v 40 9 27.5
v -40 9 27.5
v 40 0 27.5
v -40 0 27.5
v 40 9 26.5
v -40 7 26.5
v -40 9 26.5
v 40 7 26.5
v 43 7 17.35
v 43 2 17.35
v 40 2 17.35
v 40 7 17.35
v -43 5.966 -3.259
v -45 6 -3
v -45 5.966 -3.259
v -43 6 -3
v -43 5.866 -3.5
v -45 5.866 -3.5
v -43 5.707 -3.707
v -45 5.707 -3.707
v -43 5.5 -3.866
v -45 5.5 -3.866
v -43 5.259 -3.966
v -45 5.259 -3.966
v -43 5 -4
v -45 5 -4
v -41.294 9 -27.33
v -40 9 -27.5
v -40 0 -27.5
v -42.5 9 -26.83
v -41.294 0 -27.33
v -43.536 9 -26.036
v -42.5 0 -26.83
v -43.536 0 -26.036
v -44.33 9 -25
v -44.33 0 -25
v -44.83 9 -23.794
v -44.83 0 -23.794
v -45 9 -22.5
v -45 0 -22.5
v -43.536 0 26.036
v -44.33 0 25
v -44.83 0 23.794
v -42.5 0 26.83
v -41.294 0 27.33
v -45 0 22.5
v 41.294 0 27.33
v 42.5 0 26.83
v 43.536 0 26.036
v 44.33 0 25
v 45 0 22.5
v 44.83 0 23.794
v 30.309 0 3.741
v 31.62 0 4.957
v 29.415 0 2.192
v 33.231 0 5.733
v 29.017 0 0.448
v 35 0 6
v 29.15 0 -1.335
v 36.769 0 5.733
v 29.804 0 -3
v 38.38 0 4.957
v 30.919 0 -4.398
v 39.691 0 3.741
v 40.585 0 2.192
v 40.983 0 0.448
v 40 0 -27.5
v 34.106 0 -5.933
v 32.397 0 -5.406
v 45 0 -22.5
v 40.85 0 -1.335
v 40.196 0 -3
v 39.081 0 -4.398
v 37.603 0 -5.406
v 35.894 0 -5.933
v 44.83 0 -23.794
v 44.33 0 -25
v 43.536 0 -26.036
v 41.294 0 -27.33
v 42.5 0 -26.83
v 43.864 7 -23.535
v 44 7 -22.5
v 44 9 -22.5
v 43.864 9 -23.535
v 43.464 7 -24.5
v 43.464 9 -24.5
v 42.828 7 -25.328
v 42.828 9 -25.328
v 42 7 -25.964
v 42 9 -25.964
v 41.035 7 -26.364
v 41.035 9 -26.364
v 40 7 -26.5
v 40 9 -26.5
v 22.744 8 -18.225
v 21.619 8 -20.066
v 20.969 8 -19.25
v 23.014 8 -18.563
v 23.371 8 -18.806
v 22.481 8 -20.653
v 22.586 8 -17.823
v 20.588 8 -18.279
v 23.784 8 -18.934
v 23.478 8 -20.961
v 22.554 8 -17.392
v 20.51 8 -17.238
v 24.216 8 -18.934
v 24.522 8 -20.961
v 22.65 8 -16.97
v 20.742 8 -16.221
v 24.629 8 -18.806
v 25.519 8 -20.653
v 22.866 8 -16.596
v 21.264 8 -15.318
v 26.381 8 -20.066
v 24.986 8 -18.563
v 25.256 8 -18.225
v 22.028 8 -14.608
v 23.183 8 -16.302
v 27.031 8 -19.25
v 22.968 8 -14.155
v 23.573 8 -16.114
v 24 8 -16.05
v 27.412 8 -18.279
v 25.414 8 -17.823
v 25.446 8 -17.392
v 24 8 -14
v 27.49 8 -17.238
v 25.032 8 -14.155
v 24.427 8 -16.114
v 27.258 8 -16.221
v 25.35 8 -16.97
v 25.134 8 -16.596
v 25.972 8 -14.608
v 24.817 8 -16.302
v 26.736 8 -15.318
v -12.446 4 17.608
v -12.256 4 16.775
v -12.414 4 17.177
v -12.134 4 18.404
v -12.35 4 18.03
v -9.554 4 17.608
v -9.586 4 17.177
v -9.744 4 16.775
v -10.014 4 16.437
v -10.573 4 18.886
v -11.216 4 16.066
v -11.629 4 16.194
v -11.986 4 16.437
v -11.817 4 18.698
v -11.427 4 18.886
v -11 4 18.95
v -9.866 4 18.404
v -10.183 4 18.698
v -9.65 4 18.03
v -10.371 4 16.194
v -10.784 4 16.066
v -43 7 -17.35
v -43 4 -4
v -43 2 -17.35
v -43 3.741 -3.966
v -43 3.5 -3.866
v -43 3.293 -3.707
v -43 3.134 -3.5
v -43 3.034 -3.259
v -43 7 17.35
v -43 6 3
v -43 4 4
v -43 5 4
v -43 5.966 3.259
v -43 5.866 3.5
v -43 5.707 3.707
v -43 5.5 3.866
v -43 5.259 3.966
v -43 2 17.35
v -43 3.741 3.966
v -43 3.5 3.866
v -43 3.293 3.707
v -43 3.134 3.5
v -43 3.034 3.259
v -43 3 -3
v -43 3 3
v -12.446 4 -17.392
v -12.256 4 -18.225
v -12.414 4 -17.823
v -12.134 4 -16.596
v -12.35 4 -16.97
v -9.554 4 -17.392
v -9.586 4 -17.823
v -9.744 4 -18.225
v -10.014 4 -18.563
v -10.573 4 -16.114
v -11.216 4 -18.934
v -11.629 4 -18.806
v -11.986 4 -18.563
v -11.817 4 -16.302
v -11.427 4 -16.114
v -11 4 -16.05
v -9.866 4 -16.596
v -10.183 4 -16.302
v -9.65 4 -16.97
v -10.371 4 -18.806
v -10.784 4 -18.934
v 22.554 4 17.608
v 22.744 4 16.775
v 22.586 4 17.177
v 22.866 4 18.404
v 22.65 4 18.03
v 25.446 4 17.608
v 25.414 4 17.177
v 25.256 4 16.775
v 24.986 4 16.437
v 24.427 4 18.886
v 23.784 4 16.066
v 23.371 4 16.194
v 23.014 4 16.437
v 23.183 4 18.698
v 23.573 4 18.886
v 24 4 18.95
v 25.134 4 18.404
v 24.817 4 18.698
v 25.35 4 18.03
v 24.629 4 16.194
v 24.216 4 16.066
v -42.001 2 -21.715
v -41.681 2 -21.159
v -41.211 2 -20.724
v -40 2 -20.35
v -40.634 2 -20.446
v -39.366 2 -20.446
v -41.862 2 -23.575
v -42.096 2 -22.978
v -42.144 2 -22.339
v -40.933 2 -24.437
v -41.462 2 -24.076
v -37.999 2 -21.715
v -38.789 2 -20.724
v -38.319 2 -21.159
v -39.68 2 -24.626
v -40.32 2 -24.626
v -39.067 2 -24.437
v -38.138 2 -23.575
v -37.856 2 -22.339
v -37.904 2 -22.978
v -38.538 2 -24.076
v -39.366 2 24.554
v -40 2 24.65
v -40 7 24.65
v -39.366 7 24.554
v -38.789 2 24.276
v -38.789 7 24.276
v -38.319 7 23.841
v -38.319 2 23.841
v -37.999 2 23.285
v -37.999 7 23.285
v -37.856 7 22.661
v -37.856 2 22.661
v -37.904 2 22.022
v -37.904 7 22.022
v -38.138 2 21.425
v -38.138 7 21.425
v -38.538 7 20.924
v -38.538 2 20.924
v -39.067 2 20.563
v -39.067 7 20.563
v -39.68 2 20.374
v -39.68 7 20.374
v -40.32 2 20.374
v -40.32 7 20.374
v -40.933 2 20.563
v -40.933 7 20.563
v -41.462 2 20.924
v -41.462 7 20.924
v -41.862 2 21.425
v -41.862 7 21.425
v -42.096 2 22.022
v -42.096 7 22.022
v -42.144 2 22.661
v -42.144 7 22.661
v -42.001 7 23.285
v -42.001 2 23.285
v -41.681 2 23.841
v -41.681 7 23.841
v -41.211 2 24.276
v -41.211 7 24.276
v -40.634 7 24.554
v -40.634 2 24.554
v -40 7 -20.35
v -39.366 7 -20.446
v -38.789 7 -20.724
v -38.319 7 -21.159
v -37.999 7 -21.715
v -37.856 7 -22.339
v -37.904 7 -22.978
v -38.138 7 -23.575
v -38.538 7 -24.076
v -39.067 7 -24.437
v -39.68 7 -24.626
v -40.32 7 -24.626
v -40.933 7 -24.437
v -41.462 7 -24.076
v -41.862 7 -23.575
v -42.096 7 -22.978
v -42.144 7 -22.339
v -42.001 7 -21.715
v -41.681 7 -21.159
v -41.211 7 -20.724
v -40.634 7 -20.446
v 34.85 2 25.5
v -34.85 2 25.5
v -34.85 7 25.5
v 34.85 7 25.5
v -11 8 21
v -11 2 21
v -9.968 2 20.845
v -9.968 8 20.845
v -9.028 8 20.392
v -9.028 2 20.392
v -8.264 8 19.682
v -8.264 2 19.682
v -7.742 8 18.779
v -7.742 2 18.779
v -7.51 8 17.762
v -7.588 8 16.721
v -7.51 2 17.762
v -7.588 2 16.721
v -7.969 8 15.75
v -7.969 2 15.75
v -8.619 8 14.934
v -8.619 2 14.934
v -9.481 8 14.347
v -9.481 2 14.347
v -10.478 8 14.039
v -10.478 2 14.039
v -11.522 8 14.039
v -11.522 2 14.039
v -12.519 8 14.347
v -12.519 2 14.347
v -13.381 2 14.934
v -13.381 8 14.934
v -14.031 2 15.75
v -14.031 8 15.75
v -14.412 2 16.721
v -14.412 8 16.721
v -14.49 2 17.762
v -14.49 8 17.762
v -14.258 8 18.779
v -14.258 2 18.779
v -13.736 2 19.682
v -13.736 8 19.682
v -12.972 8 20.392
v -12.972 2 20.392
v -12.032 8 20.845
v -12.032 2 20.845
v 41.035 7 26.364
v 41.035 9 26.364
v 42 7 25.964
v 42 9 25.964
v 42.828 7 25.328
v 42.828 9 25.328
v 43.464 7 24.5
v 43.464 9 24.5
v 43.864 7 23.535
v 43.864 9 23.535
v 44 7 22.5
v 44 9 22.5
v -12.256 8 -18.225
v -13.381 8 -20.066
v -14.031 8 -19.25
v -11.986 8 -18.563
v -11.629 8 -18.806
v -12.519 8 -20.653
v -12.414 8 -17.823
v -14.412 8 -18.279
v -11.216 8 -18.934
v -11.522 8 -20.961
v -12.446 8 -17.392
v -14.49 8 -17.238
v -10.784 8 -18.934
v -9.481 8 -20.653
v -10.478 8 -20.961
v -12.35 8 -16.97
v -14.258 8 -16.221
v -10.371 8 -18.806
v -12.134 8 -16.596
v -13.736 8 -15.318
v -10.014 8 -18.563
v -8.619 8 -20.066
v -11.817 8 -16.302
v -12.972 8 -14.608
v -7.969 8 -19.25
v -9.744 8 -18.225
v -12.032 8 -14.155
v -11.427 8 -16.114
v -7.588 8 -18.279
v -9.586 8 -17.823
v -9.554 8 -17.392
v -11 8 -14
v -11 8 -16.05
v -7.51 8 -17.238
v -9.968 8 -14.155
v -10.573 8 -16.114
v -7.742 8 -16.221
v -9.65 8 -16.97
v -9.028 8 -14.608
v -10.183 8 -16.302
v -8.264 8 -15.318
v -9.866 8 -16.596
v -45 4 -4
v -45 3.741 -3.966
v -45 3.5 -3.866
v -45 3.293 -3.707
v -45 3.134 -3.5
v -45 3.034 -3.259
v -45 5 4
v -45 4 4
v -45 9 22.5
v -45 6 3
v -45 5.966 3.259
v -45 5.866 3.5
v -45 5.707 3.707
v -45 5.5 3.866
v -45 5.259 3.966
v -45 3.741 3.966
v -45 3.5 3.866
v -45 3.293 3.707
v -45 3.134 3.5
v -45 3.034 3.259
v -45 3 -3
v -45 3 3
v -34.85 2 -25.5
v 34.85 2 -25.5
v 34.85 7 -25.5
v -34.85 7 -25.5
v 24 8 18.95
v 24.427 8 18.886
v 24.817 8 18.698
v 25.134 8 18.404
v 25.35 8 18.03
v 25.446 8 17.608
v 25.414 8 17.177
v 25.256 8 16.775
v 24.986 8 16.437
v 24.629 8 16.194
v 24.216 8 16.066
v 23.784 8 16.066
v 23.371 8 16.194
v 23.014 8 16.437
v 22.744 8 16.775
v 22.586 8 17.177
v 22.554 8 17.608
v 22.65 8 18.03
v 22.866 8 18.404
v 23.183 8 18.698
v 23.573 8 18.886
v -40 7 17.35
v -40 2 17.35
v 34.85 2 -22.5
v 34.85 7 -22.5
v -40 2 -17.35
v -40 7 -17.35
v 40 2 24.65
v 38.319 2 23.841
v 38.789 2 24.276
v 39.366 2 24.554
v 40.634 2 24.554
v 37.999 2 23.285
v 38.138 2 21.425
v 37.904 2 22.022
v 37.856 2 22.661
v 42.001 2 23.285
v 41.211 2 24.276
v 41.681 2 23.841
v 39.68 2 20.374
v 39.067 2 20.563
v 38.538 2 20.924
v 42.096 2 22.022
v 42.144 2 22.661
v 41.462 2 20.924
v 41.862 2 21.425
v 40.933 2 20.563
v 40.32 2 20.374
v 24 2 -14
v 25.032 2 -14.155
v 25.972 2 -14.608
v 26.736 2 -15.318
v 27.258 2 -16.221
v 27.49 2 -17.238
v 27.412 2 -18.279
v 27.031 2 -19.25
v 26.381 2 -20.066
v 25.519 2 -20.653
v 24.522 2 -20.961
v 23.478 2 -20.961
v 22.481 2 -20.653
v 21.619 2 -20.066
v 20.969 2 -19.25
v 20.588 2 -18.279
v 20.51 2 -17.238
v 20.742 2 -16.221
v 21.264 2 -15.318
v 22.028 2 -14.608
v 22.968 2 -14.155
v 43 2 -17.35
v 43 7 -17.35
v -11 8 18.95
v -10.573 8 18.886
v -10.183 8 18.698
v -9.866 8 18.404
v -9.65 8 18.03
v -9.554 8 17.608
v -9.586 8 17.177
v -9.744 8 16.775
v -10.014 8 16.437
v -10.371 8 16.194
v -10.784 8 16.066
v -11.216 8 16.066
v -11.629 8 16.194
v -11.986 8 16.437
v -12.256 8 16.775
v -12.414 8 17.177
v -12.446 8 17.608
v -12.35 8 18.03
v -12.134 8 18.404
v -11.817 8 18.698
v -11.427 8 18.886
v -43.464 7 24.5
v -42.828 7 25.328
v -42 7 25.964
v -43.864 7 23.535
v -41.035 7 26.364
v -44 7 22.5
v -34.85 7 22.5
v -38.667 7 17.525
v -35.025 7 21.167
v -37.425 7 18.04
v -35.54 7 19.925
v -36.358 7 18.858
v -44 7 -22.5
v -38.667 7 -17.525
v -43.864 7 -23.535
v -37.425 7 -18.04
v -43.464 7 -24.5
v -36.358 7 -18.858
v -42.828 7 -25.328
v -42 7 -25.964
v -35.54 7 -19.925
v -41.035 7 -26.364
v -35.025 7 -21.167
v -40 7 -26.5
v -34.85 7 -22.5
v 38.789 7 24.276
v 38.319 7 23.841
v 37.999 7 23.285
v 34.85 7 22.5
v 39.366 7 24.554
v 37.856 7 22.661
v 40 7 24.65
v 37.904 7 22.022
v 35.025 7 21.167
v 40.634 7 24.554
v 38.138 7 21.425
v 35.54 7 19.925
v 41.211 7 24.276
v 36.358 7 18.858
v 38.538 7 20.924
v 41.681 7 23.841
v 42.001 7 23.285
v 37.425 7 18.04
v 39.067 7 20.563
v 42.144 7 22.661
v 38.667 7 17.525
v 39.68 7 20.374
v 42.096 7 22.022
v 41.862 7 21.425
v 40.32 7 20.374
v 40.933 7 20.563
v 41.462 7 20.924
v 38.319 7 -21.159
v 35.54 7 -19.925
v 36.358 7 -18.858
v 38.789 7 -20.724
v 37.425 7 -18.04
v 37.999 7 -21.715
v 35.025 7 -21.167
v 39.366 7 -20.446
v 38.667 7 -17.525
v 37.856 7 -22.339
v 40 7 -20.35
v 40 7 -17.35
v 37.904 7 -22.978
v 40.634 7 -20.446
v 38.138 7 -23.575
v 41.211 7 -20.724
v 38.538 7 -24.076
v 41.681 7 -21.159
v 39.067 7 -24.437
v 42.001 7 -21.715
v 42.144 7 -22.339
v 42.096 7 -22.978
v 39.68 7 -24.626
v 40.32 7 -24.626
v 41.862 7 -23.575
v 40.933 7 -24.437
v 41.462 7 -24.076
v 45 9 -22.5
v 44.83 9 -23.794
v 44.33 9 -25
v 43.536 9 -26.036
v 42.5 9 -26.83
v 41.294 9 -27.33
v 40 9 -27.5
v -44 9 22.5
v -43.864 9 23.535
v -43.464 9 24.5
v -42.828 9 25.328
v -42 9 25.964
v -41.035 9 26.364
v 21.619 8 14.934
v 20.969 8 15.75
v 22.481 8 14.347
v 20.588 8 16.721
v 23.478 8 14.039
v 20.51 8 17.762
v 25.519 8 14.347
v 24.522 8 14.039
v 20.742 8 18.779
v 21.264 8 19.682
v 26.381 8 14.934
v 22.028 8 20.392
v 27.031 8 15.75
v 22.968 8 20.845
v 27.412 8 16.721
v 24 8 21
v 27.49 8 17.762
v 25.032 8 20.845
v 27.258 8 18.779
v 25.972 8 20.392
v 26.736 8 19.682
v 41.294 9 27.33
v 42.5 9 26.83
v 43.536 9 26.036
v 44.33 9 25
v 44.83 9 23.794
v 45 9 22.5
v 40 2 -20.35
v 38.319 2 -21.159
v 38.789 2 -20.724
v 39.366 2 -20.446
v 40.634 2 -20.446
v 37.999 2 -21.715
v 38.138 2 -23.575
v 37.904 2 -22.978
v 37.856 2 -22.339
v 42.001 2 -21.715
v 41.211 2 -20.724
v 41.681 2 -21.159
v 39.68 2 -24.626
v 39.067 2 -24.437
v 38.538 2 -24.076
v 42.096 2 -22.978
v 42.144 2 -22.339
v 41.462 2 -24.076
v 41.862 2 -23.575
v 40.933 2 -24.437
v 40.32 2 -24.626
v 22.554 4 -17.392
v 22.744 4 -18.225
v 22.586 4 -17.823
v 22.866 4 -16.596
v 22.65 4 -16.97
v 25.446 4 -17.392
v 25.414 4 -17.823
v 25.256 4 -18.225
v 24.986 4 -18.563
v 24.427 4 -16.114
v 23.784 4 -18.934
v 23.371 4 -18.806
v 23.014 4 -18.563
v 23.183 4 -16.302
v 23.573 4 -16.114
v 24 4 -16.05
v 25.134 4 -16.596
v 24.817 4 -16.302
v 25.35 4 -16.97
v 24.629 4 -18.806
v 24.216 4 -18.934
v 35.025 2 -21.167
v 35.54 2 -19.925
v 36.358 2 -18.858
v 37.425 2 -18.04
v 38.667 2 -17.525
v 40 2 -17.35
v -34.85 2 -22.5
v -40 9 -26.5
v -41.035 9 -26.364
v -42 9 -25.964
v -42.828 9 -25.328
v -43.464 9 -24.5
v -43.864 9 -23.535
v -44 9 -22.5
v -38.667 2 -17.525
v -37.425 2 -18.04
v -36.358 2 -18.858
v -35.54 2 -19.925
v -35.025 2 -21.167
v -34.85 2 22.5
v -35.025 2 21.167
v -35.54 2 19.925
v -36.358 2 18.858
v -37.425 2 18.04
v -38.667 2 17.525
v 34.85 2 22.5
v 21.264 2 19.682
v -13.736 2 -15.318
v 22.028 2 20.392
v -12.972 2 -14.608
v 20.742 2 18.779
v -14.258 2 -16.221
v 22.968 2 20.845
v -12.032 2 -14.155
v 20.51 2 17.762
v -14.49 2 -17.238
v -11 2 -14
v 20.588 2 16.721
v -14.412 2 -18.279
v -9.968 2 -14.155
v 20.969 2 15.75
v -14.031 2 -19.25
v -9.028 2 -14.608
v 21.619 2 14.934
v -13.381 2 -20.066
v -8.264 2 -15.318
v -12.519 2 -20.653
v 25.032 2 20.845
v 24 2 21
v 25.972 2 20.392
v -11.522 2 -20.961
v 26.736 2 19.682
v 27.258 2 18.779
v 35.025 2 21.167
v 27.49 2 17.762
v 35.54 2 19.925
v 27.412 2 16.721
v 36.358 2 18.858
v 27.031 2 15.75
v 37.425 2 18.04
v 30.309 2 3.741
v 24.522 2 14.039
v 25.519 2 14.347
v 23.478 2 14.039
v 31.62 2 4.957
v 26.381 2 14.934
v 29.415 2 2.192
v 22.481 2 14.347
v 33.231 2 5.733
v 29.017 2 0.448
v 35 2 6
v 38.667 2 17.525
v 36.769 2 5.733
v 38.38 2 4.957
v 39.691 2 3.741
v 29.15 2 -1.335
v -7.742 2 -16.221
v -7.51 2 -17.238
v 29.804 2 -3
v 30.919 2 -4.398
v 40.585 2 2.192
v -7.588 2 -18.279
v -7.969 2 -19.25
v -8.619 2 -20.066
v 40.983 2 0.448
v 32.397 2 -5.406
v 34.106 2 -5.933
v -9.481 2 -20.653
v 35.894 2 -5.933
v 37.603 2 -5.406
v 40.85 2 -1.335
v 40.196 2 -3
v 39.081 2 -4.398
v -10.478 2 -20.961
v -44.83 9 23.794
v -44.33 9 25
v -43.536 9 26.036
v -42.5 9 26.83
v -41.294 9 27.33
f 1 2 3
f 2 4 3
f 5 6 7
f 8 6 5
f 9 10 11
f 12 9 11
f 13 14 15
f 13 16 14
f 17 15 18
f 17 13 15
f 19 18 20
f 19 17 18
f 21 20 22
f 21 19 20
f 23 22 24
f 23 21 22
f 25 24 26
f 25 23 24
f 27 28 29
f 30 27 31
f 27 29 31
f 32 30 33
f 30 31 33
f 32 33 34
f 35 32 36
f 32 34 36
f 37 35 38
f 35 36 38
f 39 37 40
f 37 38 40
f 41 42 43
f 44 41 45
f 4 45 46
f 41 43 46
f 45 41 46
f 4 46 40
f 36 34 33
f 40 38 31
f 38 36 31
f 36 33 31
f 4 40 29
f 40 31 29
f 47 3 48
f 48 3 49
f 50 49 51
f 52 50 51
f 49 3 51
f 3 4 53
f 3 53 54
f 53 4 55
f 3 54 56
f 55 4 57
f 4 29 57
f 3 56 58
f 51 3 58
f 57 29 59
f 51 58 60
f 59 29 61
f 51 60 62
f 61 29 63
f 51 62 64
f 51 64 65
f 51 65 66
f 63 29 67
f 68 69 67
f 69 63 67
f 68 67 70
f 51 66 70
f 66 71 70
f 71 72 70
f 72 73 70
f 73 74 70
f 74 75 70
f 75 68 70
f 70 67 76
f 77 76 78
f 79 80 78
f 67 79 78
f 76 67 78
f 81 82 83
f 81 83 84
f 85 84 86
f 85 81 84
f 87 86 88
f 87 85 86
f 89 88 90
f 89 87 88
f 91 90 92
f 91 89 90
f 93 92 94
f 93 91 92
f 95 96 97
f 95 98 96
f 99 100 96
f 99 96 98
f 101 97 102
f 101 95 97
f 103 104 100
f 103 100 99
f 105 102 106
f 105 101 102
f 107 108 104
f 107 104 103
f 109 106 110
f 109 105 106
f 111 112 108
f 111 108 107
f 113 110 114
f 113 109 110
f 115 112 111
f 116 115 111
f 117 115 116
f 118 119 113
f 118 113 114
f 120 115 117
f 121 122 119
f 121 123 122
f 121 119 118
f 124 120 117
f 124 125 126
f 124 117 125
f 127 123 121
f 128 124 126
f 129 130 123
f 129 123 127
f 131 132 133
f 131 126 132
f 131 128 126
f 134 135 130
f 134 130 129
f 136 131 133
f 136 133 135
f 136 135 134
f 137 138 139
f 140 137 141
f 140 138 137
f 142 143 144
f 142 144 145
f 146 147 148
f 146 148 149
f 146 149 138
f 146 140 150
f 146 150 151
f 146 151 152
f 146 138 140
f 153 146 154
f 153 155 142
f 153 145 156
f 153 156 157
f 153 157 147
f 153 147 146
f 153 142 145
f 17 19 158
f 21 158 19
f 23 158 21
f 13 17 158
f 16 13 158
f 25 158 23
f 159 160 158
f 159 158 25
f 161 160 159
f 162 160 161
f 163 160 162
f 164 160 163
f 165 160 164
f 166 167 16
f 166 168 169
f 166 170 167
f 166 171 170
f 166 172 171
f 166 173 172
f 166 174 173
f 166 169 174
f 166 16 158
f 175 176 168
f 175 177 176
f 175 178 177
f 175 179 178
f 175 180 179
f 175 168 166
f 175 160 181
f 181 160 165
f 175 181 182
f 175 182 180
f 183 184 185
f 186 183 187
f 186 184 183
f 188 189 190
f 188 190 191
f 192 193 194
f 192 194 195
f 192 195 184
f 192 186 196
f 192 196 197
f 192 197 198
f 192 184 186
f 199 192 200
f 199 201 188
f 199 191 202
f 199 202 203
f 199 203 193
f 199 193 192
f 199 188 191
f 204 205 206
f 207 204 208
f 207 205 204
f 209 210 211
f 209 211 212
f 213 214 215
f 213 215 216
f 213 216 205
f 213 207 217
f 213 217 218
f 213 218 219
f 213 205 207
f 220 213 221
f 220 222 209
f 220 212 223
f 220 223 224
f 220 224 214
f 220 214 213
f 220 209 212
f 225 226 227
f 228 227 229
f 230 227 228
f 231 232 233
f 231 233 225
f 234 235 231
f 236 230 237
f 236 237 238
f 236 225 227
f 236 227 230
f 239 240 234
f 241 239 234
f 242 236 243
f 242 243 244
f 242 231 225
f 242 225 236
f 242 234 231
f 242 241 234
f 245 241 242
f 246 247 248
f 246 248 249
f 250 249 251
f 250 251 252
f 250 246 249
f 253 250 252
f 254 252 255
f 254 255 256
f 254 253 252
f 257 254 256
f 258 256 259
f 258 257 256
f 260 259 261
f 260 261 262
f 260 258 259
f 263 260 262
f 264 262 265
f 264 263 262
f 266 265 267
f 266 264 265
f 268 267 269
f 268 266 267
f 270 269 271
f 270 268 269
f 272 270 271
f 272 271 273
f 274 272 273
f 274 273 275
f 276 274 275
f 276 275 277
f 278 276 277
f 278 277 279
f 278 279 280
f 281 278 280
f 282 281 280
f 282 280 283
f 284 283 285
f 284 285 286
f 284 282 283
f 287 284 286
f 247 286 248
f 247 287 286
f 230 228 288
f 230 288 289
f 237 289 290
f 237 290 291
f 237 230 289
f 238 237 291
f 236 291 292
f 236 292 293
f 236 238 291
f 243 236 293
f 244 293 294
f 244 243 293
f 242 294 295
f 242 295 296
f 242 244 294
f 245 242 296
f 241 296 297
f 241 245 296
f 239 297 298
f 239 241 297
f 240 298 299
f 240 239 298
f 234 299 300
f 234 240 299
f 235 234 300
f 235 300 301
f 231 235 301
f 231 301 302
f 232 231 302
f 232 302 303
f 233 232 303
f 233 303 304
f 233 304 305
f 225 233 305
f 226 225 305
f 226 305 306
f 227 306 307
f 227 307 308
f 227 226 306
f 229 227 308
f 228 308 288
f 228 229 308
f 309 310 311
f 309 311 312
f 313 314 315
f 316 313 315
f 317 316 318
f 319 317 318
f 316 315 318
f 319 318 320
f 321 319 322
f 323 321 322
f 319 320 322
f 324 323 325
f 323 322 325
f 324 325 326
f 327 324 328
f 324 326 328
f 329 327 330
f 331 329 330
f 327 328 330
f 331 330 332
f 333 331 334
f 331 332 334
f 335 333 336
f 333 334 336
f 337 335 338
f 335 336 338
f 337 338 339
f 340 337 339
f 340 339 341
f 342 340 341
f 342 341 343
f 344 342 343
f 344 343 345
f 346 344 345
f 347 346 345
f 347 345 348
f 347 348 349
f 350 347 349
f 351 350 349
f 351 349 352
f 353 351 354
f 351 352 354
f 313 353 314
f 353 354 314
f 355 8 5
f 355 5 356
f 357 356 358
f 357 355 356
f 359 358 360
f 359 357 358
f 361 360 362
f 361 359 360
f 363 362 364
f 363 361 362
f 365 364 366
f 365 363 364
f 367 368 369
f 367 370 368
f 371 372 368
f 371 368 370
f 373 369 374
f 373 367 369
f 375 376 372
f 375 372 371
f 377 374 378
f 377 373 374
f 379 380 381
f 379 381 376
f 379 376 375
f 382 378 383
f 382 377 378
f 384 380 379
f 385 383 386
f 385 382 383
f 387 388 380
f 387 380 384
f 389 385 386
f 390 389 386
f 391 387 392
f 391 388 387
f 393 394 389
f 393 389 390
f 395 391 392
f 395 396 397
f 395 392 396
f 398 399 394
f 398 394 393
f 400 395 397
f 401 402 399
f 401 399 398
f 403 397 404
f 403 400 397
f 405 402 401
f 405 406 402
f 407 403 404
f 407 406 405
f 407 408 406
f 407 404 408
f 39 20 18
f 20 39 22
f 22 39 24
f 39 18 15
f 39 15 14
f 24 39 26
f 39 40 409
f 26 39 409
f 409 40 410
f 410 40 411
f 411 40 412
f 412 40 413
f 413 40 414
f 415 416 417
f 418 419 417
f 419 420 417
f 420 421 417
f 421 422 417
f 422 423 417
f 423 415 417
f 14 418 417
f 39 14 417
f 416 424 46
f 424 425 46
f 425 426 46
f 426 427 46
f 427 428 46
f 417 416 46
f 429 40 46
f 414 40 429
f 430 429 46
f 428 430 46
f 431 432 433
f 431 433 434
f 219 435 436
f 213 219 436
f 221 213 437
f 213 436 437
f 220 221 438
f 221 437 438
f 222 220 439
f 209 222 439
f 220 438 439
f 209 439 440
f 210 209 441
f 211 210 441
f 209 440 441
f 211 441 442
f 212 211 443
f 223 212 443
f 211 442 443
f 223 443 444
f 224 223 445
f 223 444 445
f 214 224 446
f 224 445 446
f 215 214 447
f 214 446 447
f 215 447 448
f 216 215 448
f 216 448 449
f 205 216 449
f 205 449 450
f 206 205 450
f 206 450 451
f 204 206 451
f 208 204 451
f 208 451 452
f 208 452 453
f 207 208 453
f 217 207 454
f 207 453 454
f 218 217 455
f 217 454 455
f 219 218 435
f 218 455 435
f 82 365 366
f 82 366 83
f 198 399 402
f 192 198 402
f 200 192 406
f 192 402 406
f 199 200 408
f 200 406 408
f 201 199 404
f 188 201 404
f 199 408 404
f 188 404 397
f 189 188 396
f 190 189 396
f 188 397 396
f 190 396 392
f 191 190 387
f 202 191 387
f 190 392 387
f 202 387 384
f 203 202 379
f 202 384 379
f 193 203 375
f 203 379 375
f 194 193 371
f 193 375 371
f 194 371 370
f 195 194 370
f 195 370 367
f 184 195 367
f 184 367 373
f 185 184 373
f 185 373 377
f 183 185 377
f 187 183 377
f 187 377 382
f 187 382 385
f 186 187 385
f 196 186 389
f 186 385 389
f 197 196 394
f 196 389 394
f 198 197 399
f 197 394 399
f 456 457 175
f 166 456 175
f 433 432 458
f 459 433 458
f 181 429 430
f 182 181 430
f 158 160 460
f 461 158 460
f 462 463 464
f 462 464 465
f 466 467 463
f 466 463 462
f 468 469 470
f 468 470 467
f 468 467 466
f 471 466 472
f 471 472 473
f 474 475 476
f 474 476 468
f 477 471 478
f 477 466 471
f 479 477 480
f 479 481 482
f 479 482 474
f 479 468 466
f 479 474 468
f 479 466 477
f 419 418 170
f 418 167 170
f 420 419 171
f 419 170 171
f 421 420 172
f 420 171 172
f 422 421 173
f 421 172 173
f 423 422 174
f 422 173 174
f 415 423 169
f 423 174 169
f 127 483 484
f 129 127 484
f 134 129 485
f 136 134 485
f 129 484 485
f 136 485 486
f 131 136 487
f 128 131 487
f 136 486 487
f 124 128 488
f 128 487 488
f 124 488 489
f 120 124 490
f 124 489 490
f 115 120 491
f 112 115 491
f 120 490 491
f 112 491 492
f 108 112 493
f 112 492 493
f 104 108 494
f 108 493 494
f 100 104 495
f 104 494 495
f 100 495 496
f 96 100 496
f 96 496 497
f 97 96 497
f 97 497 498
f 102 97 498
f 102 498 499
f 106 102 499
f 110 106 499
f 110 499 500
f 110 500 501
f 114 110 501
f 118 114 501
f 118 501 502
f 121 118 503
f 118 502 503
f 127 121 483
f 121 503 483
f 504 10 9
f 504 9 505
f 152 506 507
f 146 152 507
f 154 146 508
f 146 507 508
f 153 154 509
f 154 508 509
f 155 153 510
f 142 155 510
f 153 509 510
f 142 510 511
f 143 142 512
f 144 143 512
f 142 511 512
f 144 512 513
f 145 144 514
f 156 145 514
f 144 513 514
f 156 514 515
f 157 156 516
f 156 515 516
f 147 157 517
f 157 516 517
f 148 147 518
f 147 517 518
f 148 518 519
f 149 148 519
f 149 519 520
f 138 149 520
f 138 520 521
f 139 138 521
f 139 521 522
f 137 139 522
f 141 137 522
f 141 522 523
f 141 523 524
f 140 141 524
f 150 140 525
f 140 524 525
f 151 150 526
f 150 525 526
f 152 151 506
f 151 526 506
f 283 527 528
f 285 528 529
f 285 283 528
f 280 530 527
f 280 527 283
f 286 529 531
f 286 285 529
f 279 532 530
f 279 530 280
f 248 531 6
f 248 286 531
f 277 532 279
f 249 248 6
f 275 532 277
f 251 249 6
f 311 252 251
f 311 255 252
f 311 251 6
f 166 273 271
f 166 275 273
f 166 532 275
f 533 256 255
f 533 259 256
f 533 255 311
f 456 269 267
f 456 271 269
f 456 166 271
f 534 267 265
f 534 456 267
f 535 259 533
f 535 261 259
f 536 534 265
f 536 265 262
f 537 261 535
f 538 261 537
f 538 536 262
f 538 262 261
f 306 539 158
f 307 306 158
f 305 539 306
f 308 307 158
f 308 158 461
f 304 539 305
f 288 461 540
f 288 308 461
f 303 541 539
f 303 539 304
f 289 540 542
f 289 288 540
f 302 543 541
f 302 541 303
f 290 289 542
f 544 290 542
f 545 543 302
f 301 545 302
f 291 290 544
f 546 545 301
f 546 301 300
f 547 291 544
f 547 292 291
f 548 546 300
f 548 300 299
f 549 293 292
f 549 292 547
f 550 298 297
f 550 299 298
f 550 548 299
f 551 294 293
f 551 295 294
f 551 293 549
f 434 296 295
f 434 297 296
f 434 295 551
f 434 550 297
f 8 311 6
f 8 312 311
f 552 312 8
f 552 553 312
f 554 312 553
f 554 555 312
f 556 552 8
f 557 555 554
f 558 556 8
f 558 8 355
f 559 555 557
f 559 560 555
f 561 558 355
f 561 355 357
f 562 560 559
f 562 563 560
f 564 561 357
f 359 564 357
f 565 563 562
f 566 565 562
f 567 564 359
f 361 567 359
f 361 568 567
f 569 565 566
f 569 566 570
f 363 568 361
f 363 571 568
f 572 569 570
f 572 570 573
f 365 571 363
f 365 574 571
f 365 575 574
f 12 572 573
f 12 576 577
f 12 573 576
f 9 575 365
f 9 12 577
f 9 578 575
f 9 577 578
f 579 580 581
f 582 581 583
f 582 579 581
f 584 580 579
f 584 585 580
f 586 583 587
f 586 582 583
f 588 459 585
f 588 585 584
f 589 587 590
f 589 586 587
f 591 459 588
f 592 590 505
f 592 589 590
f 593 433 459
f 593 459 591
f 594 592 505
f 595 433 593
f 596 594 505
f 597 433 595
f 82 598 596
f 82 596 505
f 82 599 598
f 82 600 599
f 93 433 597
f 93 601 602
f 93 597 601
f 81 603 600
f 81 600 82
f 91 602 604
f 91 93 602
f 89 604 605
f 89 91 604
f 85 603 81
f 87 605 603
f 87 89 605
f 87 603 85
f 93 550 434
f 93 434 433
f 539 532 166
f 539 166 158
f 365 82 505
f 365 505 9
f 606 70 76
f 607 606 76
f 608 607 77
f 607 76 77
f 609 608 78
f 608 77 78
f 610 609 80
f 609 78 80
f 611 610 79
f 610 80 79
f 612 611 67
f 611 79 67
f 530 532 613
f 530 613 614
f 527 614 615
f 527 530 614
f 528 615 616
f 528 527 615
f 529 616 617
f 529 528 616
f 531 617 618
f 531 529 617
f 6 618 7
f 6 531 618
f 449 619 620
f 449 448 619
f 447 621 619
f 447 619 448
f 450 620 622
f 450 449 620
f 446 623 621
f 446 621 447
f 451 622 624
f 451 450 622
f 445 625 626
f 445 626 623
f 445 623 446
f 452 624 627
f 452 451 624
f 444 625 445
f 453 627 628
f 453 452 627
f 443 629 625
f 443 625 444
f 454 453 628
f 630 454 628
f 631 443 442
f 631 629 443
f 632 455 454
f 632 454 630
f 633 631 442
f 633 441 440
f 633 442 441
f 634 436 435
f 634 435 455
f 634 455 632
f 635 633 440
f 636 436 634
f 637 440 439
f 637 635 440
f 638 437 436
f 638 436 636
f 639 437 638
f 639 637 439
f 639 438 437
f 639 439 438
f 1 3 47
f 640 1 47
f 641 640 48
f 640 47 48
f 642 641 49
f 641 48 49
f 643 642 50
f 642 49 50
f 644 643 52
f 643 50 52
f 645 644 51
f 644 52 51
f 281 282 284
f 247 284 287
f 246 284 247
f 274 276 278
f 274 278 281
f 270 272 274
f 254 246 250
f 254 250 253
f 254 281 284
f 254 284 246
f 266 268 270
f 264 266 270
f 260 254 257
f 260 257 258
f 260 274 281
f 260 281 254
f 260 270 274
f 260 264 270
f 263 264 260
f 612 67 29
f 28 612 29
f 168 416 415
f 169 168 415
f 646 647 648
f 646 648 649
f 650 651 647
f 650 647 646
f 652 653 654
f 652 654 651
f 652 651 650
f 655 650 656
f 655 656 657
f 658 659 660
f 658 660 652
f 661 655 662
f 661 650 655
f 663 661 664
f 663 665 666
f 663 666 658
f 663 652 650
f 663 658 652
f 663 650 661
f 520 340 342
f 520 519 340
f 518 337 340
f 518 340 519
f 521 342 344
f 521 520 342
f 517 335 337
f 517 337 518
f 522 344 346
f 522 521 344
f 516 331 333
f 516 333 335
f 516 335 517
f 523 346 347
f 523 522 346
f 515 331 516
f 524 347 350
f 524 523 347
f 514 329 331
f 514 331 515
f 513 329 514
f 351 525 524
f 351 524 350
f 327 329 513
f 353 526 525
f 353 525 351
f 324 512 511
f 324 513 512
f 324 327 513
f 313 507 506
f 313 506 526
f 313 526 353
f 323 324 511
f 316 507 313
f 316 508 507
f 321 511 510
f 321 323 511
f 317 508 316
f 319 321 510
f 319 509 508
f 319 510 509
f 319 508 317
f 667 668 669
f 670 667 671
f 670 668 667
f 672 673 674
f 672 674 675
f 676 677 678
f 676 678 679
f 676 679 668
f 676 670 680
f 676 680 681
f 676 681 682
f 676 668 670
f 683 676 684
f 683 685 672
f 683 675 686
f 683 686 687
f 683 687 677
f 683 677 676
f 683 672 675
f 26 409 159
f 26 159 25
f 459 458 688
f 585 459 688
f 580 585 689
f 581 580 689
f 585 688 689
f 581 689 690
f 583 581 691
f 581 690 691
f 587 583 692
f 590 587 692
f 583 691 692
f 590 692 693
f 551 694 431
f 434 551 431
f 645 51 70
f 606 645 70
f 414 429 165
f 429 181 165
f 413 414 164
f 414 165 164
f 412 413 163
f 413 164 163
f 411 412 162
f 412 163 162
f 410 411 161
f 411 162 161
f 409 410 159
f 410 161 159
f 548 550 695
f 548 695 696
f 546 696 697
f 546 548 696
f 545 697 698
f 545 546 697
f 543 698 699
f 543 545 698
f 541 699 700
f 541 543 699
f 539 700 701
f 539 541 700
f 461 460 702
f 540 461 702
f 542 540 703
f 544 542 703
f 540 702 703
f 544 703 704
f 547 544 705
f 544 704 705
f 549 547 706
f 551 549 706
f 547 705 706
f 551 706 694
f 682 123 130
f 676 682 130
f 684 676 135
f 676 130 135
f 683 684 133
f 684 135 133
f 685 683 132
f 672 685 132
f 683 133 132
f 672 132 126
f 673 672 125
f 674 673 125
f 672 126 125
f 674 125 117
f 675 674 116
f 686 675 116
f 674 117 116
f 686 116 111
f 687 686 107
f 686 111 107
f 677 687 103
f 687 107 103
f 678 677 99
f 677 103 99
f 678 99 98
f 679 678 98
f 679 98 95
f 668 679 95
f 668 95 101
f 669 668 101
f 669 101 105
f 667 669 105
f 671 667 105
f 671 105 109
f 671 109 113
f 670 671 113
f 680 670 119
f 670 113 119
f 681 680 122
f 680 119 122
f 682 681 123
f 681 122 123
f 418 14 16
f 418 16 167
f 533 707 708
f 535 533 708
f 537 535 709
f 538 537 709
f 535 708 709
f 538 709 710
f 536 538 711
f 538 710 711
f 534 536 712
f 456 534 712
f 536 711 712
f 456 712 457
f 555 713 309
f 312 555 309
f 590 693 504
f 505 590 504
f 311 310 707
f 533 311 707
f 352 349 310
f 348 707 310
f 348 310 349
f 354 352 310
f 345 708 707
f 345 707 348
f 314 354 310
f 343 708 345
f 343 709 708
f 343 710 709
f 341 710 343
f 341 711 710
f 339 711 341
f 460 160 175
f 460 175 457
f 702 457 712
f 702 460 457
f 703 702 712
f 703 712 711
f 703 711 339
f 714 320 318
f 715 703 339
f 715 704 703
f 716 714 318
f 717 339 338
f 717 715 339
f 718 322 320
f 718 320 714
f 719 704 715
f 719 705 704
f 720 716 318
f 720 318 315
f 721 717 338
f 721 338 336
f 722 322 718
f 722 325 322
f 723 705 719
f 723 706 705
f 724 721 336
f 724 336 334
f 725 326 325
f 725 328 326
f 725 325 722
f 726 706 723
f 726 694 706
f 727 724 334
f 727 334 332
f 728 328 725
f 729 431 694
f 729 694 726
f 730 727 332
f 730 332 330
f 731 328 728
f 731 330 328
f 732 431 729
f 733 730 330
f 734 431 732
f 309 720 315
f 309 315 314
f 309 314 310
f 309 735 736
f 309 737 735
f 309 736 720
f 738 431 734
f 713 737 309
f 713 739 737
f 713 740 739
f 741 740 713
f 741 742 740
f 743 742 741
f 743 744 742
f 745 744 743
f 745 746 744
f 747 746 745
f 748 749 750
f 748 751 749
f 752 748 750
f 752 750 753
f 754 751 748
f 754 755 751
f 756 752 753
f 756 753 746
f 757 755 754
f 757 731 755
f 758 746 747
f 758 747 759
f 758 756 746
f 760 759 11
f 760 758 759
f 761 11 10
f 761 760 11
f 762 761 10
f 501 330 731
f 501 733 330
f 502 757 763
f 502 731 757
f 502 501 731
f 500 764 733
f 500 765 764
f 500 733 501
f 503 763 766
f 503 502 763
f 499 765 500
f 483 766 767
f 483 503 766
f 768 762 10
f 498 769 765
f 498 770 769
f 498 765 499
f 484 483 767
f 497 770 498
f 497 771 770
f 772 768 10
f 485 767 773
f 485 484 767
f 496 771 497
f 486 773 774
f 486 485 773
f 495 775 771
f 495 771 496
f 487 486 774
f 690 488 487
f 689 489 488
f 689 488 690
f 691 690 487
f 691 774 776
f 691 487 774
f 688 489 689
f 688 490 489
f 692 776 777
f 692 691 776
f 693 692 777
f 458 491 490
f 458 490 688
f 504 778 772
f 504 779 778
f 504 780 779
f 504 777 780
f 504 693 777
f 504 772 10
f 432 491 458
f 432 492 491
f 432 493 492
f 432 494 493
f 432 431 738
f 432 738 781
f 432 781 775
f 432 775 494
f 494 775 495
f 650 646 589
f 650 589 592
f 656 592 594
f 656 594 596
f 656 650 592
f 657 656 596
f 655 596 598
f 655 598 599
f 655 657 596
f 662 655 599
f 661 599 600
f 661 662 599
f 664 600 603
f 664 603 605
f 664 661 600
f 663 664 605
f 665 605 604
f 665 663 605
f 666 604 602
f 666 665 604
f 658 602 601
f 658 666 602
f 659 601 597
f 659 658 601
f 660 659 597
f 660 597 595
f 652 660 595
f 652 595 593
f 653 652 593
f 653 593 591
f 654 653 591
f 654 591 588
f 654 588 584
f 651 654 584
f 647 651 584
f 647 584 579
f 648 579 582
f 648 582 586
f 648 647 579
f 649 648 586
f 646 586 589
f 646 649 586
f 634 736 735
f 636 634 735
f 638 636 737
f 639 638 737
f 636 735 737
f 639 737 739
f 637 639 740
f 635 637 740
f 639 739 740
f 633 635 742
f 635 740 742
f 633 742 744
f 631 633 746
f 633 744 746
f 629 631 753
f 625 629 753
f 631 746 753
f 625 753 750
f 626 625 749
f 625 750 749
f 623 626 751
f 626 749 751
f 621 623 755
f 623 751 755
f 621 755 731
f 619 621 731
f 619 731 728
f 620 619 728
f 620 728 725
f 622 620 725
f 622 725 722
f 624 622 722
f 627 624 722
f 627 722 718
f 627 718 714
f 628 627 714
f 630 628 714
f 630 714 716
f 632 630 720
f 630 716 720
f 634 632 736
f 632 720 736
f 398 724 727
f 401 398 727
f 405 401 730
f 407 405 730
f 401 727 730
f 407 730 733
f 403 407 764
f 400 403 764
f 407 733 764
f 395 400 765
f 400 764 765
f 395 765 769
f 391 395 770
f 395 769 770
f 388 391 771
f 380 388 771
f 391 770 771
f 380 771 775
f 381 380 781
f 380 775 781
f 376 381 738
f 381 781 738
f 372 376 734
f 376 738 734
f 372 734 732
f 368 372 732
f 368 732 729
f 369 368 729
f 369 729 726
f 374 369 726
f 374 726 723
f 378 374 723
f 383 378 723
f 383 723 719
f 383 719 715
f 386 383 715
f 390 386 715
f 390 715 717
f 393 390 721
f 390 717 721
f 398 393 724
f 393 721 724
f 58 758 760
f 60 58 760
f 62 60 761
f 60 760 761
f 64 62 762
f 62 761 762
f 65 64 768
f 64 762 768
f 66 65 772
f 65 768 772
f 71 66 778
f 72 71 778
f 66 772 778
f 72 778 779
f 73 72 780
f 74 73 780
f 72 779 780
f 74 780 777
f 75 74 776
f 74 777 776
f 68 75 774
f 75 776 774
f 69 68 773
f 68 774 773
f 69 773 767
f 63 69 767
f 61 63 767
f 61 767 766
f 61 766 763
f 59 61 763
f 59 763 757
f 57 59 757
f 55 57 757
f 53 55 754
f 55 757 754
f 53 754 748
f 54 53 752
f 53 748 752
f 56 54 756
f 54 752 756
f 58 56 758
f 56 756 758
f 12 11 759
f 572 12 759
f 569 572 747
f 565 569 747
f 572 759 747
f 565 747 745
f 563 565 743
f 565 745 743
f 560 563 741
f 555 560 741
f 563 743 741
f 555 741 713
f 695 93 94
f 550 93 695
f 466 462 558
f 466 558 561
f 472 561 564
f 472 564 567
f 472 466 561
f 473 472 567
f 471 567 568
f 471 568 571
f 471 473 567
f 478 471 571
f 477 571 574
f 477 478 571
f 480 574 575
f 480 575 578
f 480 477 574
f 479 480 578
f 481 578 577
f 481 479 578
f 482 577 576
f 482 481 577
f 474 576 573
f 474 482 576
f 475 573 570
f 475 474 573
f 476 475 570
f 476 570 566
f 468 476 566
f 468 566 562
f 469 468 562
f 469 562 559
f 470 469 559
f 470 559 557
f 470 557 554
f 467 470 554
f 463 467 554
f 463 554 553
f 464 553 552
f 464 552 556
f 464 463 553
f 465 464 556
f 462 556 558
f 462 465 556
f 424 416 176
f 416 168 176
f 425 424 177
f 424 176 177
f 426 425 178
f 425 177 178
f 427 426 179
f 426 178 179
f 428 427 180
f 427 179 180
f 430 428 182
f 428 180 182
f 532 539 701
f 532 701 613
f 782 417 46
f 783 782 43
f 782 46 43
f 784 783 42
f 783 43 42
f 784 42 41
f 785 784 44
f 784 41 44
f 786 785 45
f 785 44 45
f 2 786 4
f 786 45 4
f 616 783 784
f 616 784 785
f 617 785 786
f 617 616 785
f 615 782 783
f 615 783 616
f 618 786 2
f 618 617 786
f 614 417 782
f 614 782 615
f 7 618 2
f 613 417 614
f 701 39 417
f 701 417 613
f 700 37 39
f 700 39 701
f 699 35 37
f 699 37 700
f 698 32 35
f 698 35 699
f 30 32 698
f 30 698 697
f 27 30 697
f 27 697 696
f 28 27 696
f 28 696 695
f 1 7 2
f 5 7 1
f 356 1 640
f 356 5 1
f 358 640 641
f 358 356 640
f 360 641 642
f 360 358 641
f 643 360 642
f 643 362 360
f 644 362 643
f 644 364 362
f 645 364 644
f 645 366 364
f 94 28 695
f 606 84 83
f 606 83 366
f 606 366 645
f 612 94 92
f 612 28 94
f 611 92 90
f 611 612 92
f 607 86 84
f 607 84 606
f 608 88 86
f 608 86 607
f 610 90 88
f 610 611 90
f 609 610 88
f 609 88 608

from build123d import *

# Parameters (mm, degrees)
ESQUISSE1_W             = 70
ESQUISSE1_H             = 55
ESQUISSE1_W_2           = 10
BOSS_EXTRU_1_DEPTH      = 2
ESQUISSE2_R             = 3.5
BOSS_EXTRU_2_DEPTH      = 6
ESQUISSE3_R             = 1.45
ENL_V_MAT_EXTRU_1_DEPTH = 4
ESQUISSE9_W             = 10
ESQUISSE9_H             = 55
BOSS_EXTRU_3_DEPTH      = 2
ESQUISSE10_R            = 6
ENL_V_MAT_EXTRU_8_DEPTH = 2
CONG_2_R                = 5
BOSS_EXTRU_4_DEPTH      = 5
BOSS_EXTRU_5_DEPTH      = 2
ESQUISSE15_R            = 2.15
BOSS_EXTRU_7_DEPTH      = 5
ESQUISSE17_W            = 8
ESQUISSE17_H            = 3
ENL_V_MAT_EXTRU_9_DEPTH = 10
CONG_3_R                = 1


with BuildPart() as part:
    # Esquisse1 → Boss.-Extru.1 (new body)
    with BuildSketch(Plane(origin=(0, 0, 0), x_dir=(1, 0, 0), z_dir=(0, 1, 0))):
        Rectangle(ESQUISSE1_W, ESQUISSE1_H)
        with Locations((-40, 0)):
            Rectangle(ESQUISSE1_W_2, ESQUISSE1_H)
    extrude(amount=BOSS_EXTRU_1_DEPTH)

    # Esquisse2 → Boss.-Extru.2 (add)
    with BuildSketch(Plane(origin=(0, 2, 0), x_dir=(1, 0, 0), z_dir=(0, 1, 0))):
        with Locations(Location((-11, 17.5, 0), (0, 0, 270))):
            Circle(ESQUISSE2_R)
        with Locations(Location((24, 17.5, 0), (0, 0, 270))):
            Circle(ESQUISSE2_R)
        with Locations(Location((24, -17.5, 0), (0, 0, 270))):
            Circle(ESQUISSE2_R)
        with Locations(Location((-11, -17.5, 0), (0, 0, 270))):
            Circle(ESQUISSE2_R)
    extrude(amount=BOSS_EXTRU_2_DEPTH)

    # Esquisse3 → Enlèv. mat.-Extru.1 (cut)
    with BuildSketch(Plane(origin=(0, 8, 0), x_dir=(1, 0, 0), z_dir=(0, 1, 0))):
        with Locations(Location((-11, 17.5, 0), (0, 0, 270))):
            Circle(ESQUISSE3_R)
        with Locations(Location((24, 17.5, 0), (0, 0, 270))):
            Circle(ESQUISSE3_R)
        with Locations(Location((24, -17.5, 0), (0, 0, 270))):
            Circle(ESQUISSE3_R)
        with Locations(Location((-11, -17.5, 0), (0, 0, 270))):
            Circle(ESQUISSE3_R)
    extrude(amount=-ENL_V_MAT_EXTRU_1_DEPTH, mode=Mode.SUBTRACT)

    # Esquisse9 → Boss.-Extru.3 (add)
    with BuildSketch(Plane(origin=(0, 2, 0), x_dir=(1, 0, 0), z_dir=(0, 1, 0))):
        with Locations((40, 0)):
            Rectangle(ESQUISSE9_W, ESQUISSE9_H)
    extrude(amount=-BOSS_EXTRU_3_DEPTH)

    # Esquisse10 → Enlèv. mat.-Extru.8 (cut)
    with BuildSketch(Plane(origin=(0, 2, 0), x_dir=(1, 0, 0), z_dir=(0, 1, 0))):
        with Locations(Location((35, 0, 0), (0, 0, 270))):
            Circle(ESQUISSE10_R)
    extrude(amount=-ENL_V_MAT_EXTRU_8_DEPTH, mode=Mode.SUBTRACT)

    # Congé2
    cong_2_edges = [part.edges().sort_by_distance(p)[0] for p in [
        (45, 1, -27.5),
        (45, 1, 27.5),
        (-45, 1, 27.5),
        (-45, 1, -27.5),
    ]]
    fillet(cong_2_edges, radius=CONG_2_R)

    # Esquisse12 → Boss.-Extru.4 (add)
    with BuildSketch(Plane(origin=(0, 2, 0), x_dir=(1, 0, 0), z_dir=(0, 1, 0))):
        with BuildLine():
            Line((40, 27.5), (-40, 27.5))
            ThreePointArc((-40, 27.5), (-43.535533906, 26.035533906), (-45, 22.5))
            Line((-45, 22.5), (-45, -22.5))
            ThreePointArc((-45, -22.5), (-43.535533906, -26.035533906), (-40, -27.5))
            Line((-40, -27.5), (40, -27.5))
            ThreePointArc((40, -27.5), (43.535533906, -26.035533906), (45, -22.5))
            Line((45, -22.5), (45, 22.5))
            ThreePointArc((45, 22.5), (43.535533906, 26.035533906), (40, 27.5))
        make_face()
        with BuildLine():
            Line((43, -22.5), (43, 22.5))
            ThreePointArc((43, 22.5), (42.121320344, 24.621320344), (40, 25.5))
            Line((40, 25.5), (-40, 25.5))
            ThreePointArc((-40, 25.5), (-42.121320344, 24.621320344), (-43, 22.5))
            Line((-43, 22.5), (-43, -22.5))
            ThreePointArc((-43, -22.5), (-42.121320344, -24.621320344), (-40, -25.5))
            Line((-40, -25.5), (40, -25.5))
            ThreePointArc((40, -25.5), (42.121320344, -24.621320344), (43, -22.5))
        make_face(mode=Mode.SUBTRACT)
    extrude(amount=BOSS_EXTRU_4_DEPTH)

    # Esquisse13 → Boss.-Extru.5 (add)
    with BuildSketch(Plane(origin=(0, 7, 0), x_dir=(1, 0, 0), z_dir=(0, 1, 0))):
        with BuildLine():
            Line((40, 27.5), (-40, 27.5))
            ThreePointArc((-40, 27.5), (-43.535533906, 26.035533906), (-45, 22.5))
            Line((-45, 22.5), (-45, -22.5))
            ThreePointArc((-45, -22.5), (-43.535533906, -26.035533906), (-40, -27.5))
            Line((-40, -27.5), (40, -27.5))
            ThreePointArc((40, -27.5), (43.535533906, -26.035533906), (45, -22.5))
            Line((45, -22.5), (45, 22.5))
            ThreePointArc((45, 22.5), (43.535533906, 26.035533906), (40, 27.5))
        make_face()
        with BuildLine():
            Line((40, 26.5), (-40, 26.5))
            ThreePointArc((-40, 26.5), (-42.828427125, 25.328427125), (-44, 22.5))
            Line((-44, 22.5), (-44, -22.5))
            ThreePointArc((-44, -22.5), (-42.828427125, -25.328427125), (-40, -26.5))
            Line((-40, -26.5), (40, -26.5))
            ThreePointArc((40, -26.5), (42.828427125, -25.328427125), (44, -22.5))
            Line((44, -22.5), (44, 22.5))
            ThreePointArc((44, 22.5), (42.828427125, 25.328427125), (40, 26.5))
        make_face(mode=Mode.SUBTRACT)
    extrude(amount=BOSS_EXTRU_5_DEPTH)

    # Esquisse15 → Boss.-Extru.7 (add)
    # profile 1 of 4: a face of its own
    with BuildSketch(Plane(origin=(0, 2, 0), x_dir=(1, 0, 0), z_dir=(0, 1, 0))):
        with BuildLine():
            ThreePointArc((-40, 17.35), (-36.358400077, 18.858400077), (-34.85, 22.5))
            Line((-34.85, 22.5), (-34.85, 25.5))
            Line((-34.85, 25.5), (-40, 25.5))
            ThreePointArc((-40, 25.5), (-42.121320344, 24.621320344), (-43, 22.5))
            Line((-43, 22.5), (-43, 17.35))
            Line((-43, 17.35), (-40, 17.35))
        make_face()
        with Locations(Location((-40, 22.5, 0), (0, 0, 270))):
            Circle(ESQUISSE15_R, mode=Mode.SUBTRACT)
    # profile 2 of 4: a face of its own
    with BuildSketch(Plane(origin=(0, 2, 0), x_dir=(1, 0, 0), z_dir=(0, 1, 0))):
        with BuildLine():
            Line((40, 25.5), (34.85, 25.5))
            Line((34.85, 25.5), (34.85, 22.5))
            ThreePointArc((34.85, 22.5), (36.358400077, 18.858400077), (40, 17.35))
            Line((40, 17.35), (43, 17.35))
            Line((43, 17.35), (43, 22.5))
            ThreePointArc((43, 22.5), (42.121320344, 24.621320344), (40, 25.5))
        make_face()
        with Locations(Location((40, 22.5, 0), (0, 0, 270))):
            Circle(ESQUISSE15_R, mode=Mode.SUBTRACT)
    # profile 3 of 4: a face of its own
    with BuildSketch(Plane(origin=(0, 2, 0), x_dir=(1, 0, 0), z_dir=(0, 1, 0))):
        with BuildLine():
            Line((43, -22.5), (43, -17.35))
            Line((43, -17.35), (40, -17.35))
            ThreePointArc((40, -17.35), (36.358400077, -18.858400077), (34.85, -22.5))
            Line((34.85, -22.5), (34.85, -25.5))
            Line((34.85, -25.5), (40, -25.5))
            ThreePointArc((40, -25.5), (42.121320344, -24.621320344), (43, -22.5))
        make_face()
        with Locations(Location((40, -22.5, 0), (0, 0, 270))):
            Circle(ESQUISSE15_R, mode=Mode.SUBTRACT)
    # profile 4 of 4: a face of its own
    with BuildSketch(Plane(origin=(0, 2, 0), x_dir=(1, 0, 0), z_dir=(0, 1, 0))):
        with BuildLine():
            Line((-40, -17.35), (-43, -17.35))
            Line((-43, -17.35), (-43, -22.5))
            ThreePointArc((-43, -22.5), (-42.121320344, -24.621320344), (-40, -25.5))
            Line((-40, -25.5), (-34.85, -25.5))
            Line((-34.85, -25.5), (-34.85, -22.5))
            ThreePointArc((-34.85, -22.5), (-36.358400077, -18.858400077), (-40, -17.35))
        make_face()
        with Locations(Location((-40, -22.5, 0), (0, 0, 270))):
            Circle(ESQUISSE15_R, mode=Mode.SUBTRACT)
    extrude(amount=BOSS_EXTRU_7_DEPTH)

    # Esquisse17 → Enlèv. mat.-Extru.9 (cut)
    with BuildSketch(Plane.ZY.offset(45)):
        with Locations((0, 4.5)):
            Rectangle(ESQUISSE17_W, ESQUISSE17_H)
    extrude(amount=-ENL_V_MAT_EXTRU_9_DEPTH, mode=Mode.SUBTRACT)

    # Congé3
    cong_3_edges = [part.edges().sort_by_distance(p)[0] for p in [
        (-44, 6, 4),
        (-44, 3, 4),
        (-44, 3, -4),
        (-44, 6, -4),
    ]]
    fillet(cong_3_edges, radius=CONG_3_R)


solid = part.part
